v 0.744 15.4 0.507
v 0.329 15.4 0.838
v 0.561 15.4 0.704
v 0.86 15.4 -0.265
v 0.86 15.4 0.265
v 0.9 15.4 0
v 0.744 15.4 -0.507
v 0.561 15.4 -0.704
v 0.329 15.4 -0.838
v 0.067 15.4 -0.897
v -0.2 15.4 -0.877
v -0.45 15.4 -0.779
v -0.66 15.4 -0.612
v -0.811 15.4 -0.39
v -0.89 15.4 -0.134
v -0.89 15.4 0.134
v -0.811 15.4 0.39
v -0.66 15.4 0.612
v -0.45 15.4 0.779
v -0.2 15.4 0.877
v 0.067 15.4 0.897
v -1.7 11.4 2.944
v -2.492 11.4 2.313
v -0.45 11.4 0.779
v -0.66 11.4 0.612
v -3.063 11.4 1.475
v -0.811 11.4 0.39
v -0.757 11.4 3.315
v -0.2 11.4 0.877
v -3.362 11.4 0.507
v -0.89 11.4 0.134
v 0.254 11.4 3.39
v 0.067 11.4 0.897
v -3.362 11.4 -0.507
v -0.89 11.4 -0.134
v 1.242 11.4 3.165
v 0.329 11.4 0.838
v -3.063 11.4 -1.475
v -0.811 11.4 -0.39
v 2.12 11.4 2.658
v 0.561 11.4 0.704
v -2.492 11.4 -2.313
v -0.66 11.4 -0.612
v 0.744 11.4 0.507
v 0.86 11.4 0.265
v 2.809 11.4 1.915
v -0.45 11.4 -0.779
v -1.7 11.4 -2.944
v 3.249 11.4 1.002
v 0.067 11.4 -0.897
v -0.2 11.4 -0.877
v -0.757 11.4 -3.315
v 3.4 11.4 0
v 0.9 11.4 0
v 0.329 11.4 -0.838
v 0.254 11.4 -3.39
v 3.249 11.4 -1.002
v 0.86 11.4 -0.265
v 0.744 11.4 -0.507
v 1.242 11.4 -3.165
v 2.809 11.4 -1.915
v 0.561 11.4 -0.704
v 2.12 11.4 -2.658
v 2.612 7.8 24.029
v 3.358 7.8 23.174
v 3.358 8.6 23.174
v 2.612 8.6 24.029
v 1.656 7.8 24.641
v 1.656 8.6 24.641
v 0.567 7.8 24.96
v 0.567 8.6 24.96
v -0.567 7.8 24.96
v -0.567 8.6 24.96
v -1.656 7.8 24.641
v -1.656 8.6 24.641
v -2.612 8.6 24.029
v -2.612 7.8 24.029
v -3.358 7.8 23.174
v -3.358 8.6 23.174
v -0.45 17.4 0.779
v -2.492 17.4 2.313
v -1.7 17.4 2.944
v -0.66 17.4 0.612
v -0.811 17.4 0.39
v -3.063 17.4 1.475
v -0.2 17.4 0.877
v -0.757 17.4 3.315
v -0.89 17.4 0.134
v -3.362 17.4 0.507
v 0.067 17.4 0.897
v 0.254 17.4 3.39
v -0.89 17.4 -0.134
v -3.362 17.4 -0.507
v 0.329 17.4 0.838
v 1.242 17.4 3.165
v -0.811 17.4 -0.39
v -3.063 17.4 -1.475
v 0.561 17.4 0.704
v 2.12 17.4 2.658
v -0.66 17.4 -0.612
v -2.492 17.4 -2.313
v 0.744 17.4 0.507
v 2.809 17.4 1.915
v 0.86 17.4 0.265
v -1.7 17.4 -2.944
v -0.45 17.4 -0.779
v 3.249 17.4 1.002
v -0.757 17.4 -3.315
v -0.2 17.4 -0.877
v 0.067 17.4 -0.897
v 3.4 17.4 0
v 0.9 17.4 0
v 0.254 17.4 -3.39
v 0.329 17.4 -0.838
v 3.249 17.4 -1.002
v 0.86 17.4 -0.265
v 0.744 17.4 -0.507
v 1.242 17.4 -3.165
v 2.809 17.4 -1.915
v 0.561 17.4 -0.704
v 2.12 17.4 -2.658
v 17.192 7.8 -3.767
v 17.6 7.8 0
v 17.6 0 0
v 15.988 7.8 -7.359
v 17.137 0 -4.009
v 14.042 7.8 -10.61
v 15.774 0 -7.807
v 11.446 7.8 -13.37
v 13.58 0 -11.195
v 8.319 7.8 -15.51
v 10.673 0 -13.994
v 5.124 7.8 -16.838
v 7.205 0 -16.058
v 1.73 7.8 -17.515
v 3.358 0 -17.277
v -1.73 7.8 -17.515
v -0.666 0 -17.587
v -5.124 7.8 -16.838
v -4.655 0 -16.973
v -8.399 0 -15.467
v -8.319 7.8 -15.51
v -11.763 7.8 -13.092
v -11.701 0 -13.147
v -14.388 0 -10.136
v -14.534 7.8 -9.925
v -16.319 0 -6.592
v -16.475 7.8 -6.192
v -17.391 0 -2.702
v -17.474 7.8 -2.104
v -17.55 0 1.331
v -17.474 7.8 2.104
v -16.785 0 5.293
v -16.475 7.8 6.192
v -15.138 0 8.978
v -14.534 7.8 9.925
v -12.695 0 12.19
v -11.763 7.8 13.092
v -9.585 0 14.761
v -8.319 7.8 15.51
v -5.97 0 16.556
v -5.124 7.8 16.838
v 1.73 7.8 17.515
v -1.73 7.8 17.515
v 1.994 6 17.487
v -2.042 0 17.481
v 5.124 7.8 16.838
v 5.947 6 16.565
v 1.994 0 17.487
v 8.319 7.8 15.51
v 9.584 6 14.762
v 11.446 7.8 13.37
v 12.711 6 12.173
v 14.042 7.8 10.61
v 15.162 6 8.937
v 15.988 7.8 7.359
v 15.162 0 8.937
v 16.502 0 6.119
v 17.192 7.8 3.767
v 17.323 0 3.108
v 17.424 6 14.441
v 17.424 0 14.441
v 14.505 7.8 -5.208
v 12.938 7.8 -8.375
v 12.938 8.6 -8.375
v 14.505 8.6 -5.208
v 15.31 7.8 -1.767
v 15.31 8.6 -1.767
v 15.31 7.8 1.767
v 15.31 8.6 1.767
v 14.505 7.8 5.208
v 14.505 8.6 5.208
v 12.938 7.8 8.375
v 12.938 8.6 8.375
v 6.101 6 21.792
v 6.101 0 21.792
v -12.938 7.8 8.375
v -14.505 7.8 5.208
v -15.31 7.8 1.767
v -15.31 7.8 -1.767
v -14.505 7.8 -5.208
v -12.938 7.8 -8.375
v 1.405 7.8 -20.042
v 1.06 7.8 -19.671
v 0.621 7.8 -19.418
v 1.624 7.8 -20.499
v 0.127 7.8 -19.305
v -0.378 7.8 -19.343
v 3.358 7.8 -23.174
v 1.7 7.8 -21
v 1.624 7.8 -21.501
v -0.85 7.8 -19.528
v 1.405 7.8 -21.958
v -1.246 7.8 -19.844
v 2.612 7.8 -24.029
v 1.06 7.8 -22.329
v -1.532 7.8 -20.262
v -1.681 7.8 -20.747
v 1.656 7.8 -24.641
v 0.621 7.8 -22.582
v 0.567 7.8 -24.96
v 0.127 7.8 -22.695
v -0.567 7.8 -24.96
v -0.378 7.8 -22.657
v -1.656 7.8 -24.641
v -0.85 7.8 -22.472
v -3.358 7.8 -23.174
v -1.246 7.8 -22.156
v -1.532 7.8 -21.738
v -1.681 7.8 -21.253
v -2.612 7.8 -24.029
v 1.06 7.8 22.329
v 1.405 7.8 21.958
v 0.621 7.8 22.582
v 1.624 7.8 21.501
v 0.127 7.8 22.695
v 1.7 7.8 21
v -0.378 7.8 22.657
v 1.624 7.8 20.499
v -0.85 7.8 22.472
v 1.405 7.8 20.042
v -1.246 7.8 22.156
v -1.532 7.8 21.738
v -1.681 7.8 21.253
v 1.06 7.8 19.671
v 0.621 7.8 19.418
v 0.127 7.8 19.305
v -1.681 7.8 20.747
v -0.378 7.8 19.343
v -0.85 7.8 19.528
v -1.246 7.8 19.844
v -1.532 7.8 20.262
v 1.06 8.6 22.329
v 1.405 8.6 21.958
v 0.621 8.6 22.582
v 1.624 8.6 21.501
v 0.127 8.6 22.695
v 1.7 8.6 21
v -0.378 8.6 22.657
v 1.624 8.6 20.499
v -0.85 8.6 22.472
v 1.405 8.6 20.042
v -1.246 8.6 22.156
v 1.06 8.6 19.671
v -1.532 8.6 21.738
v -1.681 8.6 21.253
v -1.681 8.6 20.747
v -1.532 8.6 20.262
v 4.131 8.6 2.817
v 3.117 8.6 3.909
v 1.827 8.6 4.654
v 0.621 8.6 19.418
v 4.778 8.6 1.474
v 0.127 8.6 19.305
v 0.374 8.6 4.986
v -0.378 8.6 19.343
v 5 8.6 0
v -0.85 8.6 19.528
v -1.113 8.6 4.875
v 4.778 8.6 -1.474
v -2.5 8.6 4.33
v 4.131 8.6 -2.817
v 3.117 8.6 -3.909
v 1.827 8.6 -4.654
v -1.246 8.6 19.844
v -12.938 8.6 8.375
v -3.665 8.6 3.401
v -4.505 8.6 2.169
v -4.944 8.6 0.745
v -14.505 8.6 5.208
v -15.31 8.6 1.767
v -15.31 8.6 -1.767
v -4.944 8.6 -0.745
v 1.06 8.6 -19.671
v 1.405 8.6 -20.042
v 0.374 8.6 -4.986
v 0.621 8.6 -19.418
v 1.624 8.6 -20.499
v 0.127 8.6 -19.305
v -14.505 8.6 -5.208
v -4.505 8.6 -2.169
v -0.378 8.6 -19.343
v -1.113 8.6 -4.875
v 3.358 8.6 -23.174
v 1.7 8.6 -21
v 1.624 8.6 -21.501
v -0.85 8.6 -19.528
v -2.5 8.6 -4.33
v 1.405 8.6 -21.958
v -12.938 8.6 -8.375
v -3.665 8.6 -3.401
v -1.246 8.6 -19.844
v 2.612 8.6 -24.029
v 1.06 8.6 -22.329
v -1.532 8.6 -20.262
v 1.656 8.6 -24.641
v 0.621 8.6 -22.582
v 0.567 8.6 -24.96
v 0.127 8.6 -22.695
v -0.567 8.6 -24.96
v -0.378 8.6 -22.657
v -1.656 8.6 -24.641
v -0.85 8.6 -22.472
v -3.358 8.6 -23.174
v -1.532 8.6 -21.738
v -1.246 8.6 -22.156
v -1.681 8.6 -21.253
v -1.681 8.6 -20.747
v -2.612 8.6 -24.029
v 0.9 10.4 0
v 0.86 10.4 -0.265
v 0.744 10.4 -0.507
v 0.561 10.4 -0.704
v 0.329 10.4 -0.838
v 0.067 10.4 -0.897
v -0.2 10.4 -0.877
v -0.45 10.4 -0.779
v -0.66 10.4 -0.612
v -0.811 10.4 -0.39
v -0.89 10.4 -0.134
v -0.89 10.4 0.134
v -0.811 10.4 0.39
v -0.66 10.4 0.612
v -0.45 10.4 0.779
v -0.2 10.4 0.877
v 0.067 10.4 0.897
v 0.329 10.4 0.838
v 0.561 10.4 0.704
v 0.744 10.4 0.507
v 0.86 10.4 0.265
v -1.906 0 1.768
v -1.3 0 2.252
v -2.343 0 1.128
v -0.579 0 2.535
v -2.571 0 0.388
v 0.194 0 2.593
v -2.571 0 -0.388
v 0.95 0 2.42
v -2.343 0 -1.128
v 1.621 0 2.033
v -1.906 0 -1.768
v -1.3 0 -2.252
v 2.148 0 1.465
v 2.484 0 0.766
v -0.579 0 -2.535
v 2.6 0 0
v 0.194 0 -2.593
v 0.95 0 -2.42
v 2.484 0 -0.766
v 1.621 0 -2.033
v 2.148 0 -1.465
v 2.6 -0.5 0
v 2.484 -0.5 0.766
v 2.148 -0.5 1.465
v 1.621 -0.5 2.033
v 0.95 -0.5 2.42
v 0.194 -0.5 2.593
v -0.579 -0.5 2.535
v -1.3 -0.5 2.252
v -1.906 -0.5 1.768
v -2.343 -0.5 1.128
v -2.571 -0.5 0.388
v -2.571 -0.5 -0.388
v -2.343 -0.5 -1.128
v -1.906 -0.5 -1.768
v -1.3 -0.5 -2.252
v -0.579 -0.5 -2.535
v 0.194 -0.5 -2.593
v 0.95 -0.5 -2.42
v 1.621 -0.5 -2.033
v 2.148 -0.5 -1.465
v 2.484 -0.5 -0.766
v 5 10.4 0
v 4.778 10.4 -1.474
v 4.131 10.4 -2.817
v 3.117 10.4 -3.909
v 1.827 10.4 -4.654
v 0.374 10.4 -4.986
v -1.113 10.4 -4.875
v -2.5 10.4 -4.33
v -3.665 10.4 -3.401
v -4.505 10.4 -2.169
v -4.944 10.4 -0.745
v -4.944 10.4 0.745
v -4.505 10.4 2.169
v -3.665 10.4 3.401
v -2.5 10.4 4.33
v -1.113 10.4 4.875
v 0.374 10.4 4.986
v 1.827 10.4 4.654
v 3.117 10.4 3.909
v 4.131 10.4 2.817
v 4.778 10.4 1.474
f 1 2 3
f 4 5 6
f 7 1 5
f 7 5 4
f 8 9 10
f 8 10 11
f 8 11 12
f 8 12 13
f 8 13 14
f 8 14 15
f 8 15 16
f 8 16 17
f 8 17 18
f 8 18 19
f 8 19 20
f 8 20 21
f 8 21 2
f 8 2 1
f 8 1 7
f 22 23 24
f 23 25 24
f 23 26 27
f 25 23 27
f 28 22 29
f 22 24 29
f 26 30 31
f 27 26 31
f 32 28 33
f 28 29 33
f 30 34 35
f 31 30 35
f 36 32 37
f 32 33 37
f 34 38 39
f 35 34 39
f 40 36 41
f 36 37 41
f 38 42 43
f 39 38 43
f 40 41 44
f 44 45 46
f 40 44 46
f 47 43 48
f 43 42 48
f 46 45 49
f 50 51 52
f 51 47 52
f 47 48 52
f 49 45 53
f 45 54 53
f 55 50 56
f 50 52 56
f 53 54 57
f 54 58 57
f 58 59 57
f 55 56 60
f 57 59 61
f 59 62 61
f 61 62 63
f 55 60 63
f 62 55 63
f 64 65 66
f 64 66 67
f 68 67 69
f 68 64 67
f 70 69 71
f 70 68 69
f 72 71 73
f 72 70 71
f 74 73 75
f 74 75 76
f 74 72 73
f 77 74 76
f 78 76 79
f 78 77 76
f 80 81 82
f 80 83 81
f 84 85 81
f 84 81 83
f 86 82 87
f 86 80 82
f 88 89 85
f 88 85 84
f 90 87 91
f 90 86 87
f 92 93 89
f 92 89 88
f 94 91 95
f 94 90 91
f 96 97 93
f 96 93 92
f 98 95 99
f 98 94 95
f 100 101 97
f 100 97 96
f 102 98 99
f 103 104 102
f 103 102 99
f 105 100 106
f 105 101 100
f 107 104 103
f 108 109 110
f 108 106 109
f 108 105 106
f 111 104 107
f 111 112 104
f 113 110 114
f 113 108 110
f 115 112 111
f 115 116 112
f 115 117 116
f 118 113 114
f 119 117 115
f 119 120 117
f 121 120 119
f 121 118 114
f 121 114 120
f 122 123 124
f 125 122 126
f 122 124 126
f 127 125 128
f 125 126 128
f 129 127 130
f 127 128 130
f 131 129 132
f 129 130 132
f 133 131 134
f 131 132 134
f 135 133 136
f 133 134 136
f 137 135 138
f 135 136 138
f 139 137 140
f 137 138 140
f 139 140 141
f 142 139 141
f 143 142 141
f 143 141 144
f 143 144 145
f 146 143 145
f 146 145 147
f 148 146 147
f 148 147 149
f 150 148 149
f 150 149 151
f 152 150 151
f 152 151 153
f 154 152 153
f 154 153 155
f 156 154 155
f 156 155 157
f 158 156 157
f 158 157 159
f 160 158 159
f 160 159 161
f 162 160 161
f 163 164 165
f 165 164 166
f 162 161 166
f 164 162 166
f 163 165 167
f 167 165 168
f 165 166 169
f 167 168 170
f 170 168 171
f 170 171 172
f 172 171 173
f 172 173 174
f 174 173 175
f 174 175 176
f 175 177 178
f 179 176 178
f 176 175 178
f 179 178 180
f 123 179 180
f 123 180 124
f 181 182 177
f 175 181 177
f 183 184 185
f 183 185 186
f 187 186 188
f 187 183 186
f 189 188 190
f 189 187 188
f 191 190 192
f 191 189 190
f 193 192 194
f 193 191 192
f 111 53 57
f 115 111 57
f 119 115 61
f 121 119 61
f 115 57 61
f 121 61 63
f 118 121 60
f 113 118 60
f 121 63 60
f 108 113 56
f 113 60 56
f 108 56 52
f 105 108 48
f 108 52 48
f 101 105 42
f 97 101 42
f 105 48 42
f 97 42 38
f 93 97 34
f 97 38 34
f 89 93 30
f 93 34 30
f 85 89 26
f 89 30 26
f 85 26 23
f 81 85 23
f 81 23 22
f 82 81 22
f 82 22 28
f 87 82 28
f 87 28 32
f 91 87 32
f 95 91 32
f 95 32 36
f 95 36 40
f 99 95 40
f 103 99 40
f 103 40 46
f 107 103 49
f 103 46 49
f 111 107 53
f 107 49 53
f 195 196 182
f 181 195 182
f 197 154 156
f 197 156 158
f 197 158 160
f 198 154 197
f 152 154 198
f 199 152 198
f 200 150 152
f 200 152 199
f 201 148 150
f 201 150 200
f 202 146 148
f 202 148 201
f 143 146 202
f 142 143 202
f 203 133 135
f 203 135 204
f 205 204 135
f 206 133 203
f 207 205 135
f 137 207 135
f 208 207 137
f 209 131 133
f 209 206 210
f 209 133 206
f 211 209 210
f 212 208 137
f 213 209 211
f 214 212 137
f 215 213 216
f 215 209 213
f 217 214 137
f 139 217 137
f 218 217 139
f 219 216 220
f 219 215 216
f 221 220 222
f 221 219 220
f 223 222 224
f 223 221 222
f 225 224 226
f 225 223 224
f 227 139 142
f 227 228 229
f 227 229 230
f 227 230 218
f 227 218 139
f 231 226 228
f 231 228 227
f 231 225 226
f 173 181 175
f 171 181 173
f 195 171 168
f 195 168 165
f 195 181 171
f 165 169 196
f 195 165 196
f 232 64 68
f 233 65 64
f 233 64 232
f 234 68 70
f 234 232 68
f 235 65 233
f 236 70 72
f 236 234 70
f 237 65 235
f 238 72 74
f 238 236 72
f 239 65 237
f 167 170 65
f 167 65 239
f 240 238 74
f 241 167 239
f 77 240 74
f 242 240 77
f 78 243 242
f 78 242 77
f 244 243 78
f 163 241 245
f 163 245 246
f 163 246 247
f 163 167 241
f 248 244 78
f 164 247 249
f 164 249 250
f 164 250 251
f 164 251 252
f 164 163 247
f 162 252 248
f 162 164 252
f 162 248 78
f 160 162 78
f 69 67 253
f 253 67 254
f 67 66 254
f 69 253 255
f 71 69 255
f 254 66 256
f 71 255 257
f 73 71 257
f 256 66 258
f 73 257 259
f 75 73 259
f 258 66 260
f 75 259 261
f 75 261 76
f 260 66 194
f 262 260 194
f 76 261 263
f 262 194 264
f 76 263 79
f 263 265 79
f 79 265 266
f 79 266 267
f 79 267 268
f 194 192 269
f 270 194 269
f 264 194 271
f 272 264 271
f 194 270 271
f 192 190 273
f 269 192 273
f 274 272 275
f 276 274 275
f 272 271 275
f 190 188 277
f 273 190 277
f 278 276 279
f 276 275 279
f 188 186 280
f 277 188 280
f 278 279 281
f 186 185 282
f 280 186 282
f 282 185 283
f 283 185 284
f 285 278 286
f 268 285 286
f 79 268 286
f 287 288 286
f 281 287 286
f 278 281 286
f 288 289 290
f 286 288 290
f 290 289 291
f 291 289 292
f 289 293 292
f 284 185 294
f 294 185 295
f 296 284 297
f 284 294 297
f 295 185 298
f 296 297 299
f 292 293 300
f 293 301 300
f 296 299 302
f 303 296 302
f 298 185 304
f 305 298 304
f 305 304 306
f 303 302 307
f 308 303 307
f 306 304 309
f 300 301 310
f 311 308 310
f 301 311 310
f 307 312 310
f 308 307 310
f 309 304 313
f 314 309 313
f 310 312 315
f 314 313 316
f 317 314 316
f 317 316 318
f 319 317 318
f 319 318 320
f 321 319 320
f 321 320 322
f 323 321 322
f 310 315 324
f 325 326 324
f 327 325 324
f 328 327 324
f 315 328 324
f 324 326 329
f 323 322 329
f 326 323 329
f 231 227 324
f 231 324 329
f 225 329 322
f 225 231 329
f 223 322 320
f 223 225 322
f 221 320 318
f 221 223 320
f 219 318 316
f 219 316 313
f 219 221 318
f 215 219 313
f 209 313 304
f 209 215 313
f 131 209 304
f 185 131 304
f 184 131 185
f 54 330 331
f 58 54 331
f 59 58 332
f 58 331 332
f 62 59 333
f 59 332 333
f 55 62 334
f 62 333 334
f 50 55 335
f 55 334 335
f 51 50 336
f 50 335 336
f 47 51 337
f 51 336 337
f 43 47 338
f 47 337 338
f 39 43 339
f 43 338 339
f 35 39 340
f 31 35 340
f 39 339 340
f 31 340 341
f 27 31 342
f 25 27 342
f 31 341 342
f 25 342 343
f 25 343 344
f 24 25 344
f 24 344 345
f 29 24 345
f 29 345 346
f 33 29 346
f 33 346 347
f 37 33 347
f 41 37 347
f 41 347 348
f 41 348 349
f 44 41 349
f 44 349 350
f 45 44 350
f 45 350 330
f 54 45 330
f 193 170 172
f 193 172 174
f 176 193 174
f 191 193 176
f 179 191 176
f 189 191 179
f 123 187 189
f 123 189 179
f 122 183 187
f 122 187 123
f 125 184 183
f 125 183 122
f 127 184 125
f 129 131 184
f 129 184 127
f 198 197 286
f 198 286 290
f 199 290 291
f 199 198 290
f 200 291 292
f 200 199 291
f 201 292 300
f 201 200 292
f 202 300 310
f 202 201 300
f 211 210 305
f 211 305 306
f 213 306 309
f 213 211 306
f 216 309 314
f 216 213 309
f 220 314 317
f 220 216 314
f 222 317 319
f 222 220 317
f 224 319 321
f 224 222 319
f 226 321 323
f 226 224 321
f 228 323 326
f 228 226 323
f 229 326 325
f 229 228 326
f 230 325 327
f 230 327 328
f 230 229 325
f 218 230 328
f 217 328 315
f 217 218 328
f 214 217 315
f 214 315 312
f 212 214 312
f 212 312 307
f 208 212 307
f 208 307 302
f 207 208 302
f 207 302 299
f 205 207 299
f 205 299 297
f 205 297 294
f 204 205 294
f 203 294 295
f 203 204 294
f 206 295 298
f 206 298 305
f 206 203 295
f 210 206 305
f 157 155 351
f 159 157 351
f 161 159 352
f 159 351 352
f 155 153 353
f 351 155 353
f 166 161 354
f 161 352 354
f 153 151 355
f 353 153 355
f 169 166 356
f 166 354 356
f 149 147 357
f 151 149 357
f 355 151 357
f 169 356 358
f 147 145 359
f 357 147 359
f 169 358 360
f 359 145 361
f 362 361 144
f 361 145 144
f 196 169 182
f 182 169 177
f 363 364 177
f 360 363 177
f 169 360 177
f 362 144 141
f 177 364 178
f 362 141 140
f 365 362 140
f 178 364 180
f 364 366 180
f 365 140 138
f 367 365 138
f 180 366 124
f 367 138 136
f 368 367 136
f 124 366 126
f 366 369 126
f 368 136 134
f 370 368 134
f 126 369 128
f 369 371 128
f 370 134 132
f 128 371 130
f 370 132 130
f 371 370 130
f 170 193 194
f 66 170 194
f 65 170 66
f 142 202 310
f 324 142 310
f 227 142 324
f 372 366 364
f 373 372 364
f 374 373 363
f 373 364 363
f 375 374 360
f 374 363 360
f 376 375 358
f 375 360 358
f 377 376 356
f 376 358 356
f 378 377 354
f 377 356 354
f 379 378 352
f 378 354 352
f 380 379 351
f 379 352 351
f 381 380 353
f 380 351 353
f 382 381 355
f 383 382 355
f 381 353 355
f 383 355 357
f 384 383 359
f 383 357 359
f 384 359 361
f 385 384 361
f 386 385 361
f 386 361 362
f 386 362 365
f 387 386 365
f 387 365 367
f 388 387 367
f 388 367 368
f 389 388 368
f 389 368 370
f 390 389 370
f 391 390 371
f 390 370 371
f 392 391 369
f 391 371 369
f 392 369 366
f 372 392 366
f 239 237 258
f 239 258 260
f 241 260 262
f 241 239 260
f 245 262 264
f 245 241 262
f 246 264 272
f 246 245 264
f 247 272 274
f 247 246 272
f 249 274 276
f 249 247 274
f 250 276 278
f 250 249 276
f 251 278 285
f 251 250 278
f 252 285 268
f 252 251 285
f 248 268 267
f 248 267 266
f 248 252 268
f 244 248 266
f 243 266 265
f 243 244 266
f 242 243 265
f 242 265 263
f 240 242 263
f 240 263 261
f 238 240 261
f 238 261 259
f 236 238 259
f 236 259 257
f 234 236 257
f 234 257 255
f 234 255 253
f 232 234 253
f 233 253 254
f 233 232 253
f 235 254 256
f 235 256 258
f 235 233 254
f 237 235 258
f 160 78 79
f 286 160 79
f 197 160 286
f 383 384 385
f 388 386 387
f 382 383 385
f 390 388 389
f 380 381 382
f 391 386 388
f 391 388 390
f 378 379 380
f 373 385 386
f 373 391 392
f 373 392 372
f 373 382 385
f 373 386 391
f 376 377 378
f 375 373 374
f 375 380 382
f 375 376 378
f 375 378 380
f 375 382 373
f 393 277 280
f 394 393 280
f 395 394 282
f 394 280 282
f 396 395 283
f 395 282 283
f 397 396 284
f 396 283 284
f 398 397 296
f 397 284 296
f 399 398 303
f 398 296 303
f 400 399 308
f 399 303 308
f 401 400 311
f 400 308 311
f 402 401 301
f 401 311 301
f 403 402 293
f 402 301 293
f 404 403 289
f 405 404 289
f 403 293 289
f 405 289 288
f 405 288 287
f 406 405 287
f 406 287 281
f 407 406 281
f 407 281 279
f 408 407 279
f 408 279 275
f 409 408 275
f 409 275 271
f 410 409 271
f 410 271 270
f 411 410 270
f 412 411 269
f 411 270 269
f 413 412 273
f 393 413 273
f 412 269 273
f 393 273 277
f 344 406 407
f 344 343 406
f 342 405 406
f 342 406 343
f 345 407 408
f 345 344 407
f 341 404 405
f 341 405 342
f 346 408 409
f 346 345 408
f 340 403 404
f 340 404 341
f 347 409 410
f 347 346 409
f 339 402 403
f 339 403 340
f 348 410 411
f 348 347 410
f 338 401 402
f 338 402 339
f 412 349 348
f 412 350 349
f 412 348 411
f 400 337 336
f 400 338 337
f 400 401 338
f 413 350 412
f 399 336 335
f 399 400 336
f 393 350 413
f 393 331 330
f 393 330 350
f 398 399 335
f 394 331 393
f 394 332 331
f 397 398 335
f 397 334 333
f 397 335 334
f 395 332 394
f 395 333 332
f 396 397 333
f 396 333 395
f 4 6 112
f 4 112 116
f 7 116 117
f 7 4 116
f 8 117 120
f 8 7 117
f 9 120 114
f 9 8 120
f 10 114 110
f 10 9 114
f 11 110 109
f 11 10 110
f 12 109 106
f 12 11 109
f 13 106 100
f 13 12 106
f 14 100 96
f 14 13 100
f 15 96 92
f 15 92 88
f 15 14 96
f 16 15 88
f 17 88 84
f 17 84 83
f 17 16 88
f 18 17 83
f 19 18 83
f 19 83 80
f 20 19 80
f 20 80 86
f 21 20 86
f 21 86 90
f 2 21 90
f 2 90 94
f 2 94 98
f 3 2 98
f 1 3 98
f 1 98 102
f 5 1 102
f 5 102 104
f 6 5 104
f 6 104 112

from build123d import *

# Parameters (mm, degrees)
SCHIZZO1_R                   = 17.6
ESTRUSIONE_ESTRUSIONE1_DEPTH = 7.8
SCHIZZO2_R                   = 1.7
ESTRUSIONE_ESTRUSIONE2_DEPTH = 0.8
SCHIZZO3_R                   = 5
ESTRUSIONE_ESTRUSIONE3_DEPTH = 1.8
SCHIZZO4_R                   = 0.9
ESTRUSIONE_ESTRUSIONE4_DEPTH = 5
SCHIZZO5_R                   = 2.6
ESTRUSIONE_ESTRUSIONE5_DEPTH = 0.5
ESTRUSIONE_ESTRUSIONE6_DEPTH = 6
EXTRUDE_START                = 1
SKETCH_1_R                   = 3.4
SKETCH_1_R_2                 = 0.9
EXTRUDE_1_DEPTH              = 6


with BuildPart() as part:
    # Schizzo1 → Estrusione-Estrusione1 (new body)
    with BuildSketch(Plane(origin=(0, 0, 0), x_dir=(1, 0, 0), z_dir=(0, 1, 0))):
        Circle(SCHIZZO1_R)
    extrude(amount=ESTRUSIONE_ESTRUSIONE1_DEPTH)

    # Schizzo2 → Estrusione-Estrusione2 (add)
    with BuildSketch(Plane(origin=(0, 7.8, 0), x_dir=(1, 0, 0), z_dir=(0, 1, 0))):
        with BuildLine():
            Line((-3.357806699, -23.173737374), (-12.937730964, -8.375475972))
            ThreePointArc((-12.937730964, -8.375475972), (-15.412121212, 0), (-12.937730964, 8.375475972))
            Line((-12.937730964, 8.375475972), (-3.357806699, 23.173737374))
            ThreePointArc((-3.357806699, 23.173737374), (0, 25), (3.357806699, 23.173737374))
            Line((3.357806699, 23.173737374), (12.937730964, 8.375475972))
            ThreePointArc((12.937730964, 8.375475972), (15.412121212, 0), (12.937730964, -8.375475972))
            Line((12.937730964, -8.375475972), (3.357806699, -23.173737374))
            ThreePointArc((3.357806699, -23.173737374), (0, -25), (-3.357806699, -23.173737374))
        make_face()
        with Locations((0, 21)):
            Circle(SCHIZZO2_R, mode=Mode.SUBTRACT)
        with Locations((0, -21)):
            Circle(SCHIZZO2_R, mode=Mode.SUBTRACT)
    extrude(amount=ESTRUSIONE_ESTRUSIONE2_DEPTH)

    # Schizzo3 → Estrusione-Estrusione3 (add)
    with BuildSketch(Plane(origin=(0, 8.6, 0), x_dir=(1, 0, 0), z_dir=(0, 1, 0))):
        Circle(SCHIZZO3_R)
    extrude(amount=ESTRUSIONE_ESTRUSIONE3_DEPTH)

    # Schizzo4 → Estrusione-Estrusione4 (add)
    with BuildSketch(Plane(origin=(0, 10.4, 0), x_dir=(1, 0, 0), z_dir=(0, 1, 0))):
        Circle(SCHIZZO4_R)
    extrude(amount=ESTRUSIONE_ESTRUSIONE4_DEPTH)

    # Schizzo5 → Estrusione-Estrusione5 (add)
    with BuildSketch(Plane.XZ):
        Circle(SCHIZZO5_R)
    extrude(amount=ESTRUSIONE_ESTRUSIONE5_DEPTH)

    # Schizzo6 → Estrusione-Estrusione6 (add)
    with BuildSketch(Plane.XZ):
        with BuildLine():
            Line((6.100676559, 21.792297849), (17.423572743, 14.440969942))
            Line((17.423572743, 14.440969942), (15.161900105, 8.937381339))
            ThreePointArc((15.161900105, 8.937381339), (9.583953419, 14.761701692), (1.993791209, 17.486703423))
            Line((1.993791209, 17.486703423), (6.100676559, 21.792297849))
        make_face()
    extrude(amount=-ESTRUSIONE_ESTRUSIONE6_DEPTH)

    # Эскиз1 → Бобышка-Вытянуть1 (add)
    with BuildSketch(Plane(origin=(0, 10.4, 0), x_dir=(1, 0, 0), z_dir=(0, 1, 0)).offset(EXTRUDE_START)):
        Circle(SKETCH_1_R)
        Circle(SKETCH_1_R_2, mode=Mode.SUBTRACT)
    extrude(amount=EXTRUDE_1_DEPTH)


solid = part.part
